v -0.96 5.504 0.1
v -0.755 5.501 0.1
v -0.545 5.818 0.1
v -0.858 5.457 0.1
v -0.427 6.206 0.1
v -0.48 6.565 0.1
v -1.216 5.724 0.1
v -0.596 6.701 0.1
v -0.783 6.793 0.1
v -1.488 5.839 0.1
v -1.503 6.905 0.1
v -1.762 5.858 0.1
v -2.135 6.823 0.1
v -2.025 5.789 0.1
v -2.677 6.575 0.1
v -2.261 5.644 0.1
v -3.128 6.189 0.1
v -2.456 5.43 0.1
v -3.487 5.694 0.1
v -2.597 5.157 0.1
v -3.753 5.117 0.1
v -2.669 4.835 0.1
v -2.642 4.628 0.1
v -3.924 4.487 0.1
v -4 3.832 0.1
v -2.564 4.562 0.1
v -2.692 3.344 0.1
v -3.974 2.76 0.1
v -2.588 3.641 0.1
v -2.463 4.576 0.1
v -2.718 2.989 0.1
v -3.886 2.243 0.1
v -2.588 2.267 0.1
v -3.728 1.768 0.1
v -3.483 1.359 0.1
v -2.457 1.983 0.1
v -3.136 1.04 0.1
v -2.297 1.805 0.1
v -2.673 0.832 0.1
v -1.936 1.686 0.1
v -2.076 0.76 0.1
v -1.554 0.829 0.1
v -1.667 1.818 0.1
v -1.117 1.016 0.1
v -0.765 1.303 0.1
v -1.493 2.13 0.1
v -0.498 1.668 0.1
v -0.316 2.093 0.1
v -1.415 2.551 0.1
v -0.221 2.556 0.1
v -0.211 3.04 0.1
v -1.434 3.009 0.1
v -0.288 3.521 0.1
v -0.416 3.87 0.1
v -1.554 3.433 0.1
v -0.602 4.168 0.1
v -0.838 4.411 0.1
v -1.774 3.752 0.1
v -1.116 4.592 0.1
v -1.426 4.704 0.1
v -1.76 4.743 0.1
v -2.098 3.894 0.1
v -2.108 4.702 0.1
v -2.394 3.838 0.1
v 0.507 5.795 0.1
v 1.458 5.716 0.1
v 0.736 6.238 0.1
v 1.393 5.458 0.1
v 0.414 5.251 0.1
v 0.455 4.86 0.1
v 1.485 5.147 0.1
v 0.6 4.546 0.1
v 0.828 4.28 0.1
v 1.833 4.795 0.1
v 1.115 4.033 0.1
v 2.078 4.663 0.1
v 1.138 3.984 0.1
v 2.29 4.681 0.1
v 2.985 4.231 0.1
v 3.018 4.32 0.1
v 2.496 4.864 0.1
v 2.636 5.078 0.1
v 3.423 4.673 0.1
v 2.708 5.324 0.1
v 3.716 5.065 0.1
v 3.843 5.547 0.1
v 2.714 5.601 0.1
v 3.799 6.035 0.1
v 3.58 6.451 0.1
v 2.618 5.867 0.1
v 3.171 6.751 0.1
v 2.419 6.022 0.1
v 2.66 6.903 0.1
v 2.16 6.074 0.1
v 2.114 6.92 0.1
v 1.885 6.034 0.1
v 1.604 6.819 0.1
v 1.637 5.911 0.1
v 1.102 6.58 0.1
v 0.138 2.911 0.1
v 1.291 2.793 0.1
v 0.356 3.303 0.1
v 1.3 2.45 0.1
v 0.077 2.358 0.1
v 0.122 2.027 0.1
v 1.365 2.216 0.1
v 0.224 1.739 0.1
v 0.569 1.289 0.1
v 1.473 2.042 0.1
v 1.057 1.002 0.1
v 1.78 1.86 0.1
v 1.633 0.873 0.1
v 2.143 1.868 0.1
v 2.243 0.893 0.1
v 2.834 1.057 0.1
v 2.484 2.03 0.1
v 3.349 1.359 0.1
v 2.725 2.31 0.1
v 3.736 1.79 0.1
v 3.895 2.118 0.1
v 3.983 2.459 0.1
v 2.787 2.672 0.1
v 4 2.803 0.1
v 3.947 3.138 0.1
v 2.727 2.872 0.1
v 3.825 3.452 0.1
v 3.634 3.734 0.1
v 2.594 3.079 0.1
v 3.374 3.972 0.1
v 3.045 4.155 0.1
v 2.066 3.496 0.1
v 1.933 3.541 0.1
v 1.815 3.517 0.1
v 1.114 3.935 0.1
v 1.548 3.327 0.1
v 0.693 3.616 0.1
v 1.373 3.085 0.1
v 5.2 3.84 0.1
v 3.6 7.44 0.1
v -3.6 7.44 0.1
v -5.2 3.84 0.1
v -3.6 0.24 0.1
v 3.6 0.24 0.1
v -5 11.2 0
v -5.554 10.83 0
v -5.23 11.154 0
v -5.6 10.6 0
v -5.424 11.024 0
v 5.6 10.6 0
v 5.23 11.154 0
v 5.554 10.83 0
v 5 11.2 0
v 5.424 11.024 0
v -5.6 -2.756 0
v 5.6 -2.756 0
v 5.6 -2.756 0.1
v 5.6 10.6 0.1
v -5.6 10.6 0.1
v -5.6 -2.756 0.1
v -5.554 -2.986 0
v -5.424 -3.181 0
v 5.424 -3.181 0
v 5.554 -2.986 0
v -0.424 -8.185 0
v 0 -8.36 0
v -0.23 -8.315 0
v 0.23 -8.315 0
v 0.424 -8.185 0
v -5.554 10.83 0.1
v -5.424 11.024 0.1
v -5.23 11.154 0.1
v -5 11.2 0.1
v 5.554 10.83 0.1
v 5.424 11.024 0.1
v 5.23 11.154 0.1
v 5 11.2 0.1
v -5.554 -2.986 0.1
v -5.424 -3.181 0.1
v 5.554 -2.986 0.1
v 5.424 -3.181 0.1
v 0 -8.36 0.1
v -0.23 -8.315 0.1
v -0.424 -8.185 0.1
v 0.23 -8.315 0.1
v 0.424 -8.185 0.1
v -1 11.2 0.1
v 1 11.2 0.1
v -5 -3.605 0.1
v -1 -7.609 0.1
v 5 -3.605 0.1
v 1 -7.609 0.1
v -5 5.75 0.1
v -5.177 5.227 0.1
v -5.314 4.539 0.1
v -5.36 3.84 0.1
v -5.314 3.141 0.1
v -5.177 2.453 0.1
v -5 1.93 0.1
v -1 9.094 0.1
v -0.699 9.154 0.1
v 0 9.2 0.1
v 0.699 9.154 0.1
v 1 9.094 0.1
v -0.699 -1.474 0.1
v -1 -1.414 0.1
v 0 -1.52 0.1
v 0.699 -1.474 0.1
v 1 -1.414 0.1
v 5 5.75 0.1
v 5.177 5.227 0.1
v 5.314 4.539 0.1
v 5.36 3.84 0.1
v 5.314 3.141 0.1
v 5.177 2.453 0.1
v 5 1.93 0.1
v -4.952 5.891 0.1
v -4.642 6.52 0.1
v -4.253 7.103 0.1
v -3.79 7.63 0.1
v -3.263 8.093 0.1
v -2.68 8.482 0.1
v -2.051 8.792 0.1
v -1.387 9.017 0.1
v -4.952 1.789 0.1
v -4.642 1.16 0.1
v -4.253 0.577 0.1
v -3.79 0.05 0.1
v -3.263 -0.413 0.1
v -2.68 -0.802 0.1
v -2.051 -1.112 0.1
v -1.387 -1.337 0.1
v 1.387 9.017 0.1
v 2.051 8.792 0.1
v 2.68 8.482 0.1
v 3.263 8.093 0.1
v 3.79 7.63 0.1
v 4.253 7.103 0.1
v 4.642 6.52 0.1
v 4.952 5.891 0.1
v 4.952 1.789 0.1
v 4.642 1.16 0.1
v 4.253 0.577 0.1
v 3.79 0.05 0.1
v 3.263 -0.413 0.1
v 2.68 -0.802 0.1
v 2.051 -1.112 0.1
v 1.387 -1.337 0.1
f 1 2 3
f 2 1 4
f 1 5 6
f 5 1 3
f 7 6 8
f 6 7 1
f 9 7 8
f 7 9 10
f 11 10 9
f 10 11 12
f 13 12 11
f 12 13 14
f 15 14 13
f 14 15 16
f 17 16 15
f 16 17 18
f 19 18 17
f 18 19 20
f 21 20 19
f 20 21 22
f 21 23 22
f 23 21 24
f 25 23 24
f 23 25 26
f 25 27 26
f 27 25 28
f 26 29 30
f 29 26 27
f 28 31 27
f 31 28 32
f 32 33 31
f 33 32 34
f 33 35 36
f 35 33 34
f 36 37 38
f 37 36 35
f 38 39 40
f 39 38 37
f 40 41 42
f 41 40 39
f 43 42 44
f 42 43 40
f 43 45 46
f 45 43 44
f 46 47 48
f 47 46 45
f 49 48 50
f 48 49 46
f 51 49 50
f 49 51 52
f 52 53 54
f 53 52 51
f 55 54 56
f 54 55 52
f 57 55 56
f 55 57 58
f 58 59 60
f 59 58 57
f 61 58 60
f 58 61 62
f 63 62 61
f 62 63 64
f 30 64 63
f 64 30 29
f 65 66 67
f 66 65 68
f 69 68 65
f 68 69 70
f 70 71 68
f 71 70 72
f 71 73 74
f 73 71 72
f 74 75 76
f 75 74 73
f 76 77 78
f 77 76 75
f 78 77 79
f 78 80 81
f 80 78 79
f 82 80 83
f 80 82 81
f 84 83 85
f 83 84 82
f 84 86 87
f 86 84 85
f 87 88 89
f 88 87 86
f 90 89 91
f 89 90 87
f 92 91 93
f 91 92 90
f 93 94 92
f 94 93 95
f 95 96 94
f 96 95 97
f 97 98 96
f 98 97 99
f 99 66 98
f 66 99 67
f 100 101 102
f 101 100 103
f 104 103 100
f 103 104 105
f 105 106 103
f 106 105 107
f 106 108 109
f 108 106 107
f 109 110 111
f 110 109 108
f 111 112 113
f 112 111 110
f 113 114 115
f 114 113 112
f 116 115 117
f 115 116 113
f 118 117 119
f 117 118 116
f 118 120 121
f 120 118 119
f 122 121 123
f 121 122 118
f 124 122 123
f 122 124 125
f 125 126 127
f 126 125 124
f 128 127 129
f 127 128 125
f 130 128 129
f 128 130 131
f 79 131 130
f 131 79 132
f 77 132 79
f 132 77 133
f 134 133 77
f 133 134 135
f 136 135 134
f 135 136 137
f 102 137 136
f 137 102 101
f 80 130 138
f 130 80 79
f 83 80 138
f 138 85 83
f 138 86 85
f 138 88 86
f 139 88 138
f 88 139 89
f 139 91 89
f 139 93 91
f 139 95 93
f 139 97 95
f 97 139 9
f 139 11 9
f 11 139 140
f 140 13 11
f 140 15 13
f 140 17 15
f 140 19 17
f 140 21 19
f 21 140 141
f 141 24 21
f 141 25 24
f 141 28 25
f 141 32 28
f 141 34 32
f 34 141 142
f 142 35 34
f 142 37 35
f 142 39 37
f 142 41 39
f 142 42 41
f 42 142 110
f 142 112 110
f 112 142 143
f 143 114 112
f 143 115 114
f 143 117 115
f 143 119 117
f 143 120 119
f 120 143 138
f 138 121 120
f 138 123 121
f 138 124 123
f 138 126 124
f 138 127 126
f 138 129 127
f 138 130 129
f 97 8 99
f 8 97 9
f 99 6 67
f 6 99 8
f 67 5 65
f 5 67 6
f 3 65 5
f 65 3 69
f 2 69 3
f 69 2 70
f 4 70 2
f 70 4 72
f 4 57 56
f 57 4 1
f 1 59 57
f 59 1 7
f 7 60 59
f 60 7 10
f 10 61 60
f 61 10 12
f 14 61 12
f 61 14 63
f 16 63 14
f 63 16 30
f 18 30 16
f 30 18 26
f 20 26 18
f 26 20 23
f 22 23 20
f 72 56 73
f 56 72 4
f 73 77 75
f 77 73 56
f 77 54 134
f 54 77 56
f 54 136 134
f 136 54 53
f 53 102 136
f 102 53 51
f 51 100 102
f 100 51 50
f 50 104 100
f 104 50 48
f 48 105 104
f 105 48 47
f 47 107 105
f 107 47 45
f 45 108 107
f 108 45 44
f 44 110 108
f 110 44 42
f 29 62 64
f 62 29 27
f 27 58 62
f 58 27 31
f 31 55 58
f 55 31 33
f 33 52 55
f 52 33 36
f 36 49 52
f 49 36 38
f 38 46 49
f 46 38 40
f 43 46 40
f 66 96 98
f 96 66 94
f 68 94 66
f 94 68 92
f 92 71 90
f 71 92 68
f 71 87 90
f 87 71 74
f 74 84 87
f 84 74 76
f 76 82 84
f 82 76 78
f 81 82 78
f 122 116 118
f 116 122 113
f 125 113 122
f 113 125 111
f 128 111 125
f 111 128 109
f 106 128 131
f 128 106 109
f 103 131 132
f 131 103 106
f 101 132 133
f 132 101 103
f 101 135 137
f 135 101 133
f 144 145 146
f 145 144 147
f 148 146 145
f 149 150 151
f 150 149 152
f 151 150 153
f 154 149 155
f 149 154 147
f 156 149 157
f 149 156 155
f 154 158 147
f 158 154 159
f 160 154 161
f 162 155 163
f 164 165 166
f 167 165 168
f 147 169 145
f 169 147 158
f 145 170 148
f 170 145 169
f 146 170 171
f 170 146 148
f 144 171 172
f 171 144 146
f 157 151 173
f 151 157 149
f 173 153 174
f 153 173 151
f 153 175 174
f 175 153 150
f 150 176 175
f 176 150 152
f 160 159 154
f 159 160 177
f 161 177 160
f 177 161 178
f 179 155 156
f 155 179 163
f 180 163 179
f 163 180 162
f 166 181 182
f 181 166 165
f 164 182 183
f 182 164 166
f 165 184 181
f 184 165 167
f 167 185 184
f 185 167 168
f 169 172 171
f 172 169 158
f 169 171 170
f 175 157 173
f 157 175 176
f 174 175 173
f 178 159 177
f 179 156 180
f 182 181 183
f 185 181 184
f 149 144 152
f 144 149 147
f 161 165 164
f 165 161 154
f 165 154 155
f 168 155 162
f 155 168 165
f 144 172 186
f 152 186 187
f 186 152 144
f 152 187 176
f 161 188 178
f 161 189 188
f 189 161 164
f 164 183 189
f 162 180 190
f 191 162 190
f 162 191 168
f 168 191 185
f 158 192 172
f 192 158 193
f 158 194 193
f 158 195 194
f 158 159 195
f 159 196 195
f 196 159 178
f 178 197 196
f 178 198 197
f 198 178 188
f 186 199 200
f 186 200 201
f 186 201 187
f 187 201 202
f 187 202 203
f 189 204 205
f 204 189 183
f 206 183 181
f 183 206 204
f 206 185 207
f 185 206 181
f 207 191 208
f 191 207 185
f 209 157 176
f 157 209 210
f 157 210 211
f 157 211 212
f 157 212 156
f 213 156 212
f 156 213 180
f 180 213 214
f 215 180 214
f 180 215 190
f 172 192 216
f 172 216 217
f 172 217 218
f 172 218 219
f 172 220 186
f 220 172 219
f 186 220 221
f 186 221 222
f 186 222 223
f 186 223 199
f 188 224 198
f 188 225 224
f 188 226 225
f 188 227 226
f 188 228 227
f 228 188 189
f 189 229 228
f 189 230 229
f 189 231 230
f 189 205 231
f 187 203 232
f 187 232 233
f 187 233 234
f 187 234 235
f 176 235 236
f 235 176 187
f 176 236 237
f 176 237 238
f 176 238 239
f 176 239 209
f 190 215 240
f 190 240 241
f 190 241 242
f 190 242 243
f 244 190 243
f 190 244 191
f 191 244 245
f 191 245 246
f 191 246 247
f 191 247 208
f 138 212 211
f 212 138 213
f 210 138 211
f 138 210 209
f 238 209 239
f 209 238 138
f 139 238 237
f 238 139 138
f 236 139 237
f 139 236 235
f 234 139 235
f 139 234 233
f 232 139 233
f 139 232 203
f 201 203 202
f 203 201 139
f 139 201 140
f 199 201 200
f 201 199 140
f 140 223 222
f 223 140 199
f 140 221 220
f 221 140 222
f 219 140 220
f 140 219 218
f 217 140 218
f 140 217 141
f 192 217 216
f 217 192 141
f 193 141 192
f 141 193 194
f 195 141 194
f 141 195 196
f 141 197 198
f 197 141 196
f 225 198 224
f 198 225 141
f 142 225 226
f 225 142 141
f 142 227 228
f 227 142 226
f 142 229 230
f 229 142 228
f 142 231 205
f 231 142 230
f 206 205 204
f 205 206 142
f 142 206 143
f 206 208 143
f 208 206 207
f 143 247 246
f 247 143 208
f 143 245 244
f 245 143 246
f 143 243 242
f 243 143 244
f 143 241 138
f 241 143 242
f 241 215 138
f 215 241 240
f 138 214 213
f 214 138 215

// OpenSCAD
// file: ../p/box3u12.scad
use <../lib.scad>
function ldraw_lib__box3u12() = [
// 0 Box with 3 Parallel Faces without Any Edges
// 0 Name: box3u12.dat
// 0 Author: J.C. Tchang [tchang]
// 0 !LDRAW_ORG Primitive UPDATE 2014-02
// 0 !LICENSE Licensed under CC BY 4.0 : see CAreadme.txt
// 
// 0 BFC CERTIFY CCW
  [0,"BFC","CERTIFY"],
  [0,"BFC","CCW"],
// 
// 0 !HISTORY 2014-12-23 [PTadmin] Official Update 2014-02
// 
// 
// 4 16 -1 1 1 1 1 1 1 1 -1 -1 1 -1
  [4,16,-1,1,1,1,1,1,1,1,-1,-1,1,-1],
// 4 16 -1 1 1 -1 0 1 1 0 1 1 1 1
  [4,16,-1,1,1,-1,0,1,1,0,1,1,1,1],
// 4 16 1 1 -1 1 0 -1 -1 0 -1 -1 1 -1
  [4,16,1,1,-1,1,0,-1,-1,0,-1,-1,1,-1],
];
module ldraw_lib__box3u12(step=0, col=false, unit=2/5, alt=false, line=0.2, solid=!$preview)
    makepoly(ldraw_lib__box3u12(), step=step, col=col, unit=unit, alt=alt, line=line, solid=solid);
ldraw_lib__box3u12(line=0.2);
// file: ../p/1-8cyli.scad
use <../lib.scad>
function ldraw_lib__1_8cyli() = [
// 0 Cylinder 0.125
// 0 Name: 1-8cyli.dat
// 0 Author: James Jessiman
// 0 !LDRAW_ORG Primitive UPDATE 2005-01
// 0 !LICENSE Licensed under CC BY 4.0 : see CAreadme.txt
// 
// 0 BFC CERTIFY CCW
  [0,"BFC","CERTIFY"],
  [0,"BFC","CCW"],
// 
// 0 !HISTORY 2002-04-25 [PTadmin] Official Update 2002-02
// 0 !HISTORY 2004-12-11 [nielsk] Recreated using Primitive Generator, Edge lines fixed, BFC changed to CCW
// 0 !HISTORY 2005-12-28 [PTadmin] Official Update 2005-01
// 0 !HISTORY 2007-06-22 [PTadmin] Header formatted for Contributor Agreement
// 0 !HISTORY 2008-07-01 [PTadmin] Official Update 2008-01
// 
// 
// 4 16 .9239 1 .3827 .9239 0 .3827 1 0 0 1 1 0
  [4,16,.9239,1,.3827,.9239,0,.3827,1,0,0,1,1,0],
// 4 16 .7071 1 .7071 .7071 0 .7071 .9239 0 .3827 .9239 1 .3827
  [4,16,.7071,1,.7071,.7071,0,.7071,.9239,0,.3827,.9239,1,.3827],
// 5 24 1 1 0 1 0 0 1 1 -.4142 .9239 1 .3827
  [5,24,1,1,0,1,0,0,1,1,-.4142,.9239,1,.3827],
// 5 24 .9239 1 .3827 .9239 0 .3827 1 1 0 .7071 1 .7071
  [5,24,.9239,1,.3827,.9239,0,.3827,1,1,0,.7071,1,.7071],
// 5 24 .7071 1 .7071 .7071 0 .7071 .9239 1 .3827 .4142 1 1
  [5,24,.7071,1,.7071,.7071,0,.7071,.9239,1,.3827,.4142,1,1],
// 0
];
module ldraw_lib__1_8cyli(step=0, col=false, unit=2/5, alt=false, line=0.2, solid=!$preview)
    makepoly(ldraw_lib__1_8cyli(), step=step, col=col, unit=unit, alt=alt, line=line, solid=solid);
ldraw_lib__1_8cyli(line=0.2);
// file: ../p/1-8chrd.scad
use <../lib.scad>
function ldraw_lib__1_8chrd() = [
// 0 Chord 0.125
// 0 Name: 1-8chrd.dat
// 0 Author: Orion Pobursky [OrionP]
// 0 !LDRAW_ORG Primitive UPDATE 2023-05
// 0 !LICENSE Licensed under CC BY 4.0 : see CAreadme.txt
// 
// 0 BFC CERTIFY CCW
  [0,"BFC","CERTIFY"],
  [0,"BFC","CCW"],
// 
// 0 !HISTORY 2004-04-22 [PTadmin] Official Update 2004-02
// 0 !HISTORY 2007-06-22 [PTadmin] Header formatted for Contributor Agreement
// 0 !HISTORY 2008-07-01 [PTadmin] Official Update 2008-01
// 0 !HISTORY 2023-10-27 [OrionP] Rebuilt with PrimGen2, original author westrate
// 0 !HISTORY 2023-10-31 [OrionP] Official Update 2023-05
// 
// 3 16 1 0 0 0.9239 0 0.3827 0.7071 0 0.7071
  [3,16,1,0,0,0.9239,0,0.3827,0.7071,0,0.7071],
];
module ldraw_lib__1_8chrd(step=0, col=false, unit=2/5, alt=false, line=0.2, solid=!$preview)
    makepoly(ldraw_lib__1_8chrd(), step=step, col=col, unit=unit, alt=alt, line=line, solid=solid);
ldraw_lib__1_8chrd(line=0.2);
// file: ../p/1-4cyli.scad
use <../lib.scad>
function ldraw_lib__1_4cyli() = [
// 0 Cylinder 0.25
// 0 Name: 1-4cyli.dat
// 0 Author: James Jessiman
// 0 !LDRAW_ORG Primitive UPDATE 2012-01
// 0 !LICENSE Licensed under CC BY 4.0 : see CAreadme.txt
// 
// 0 BFC CERTIFY CCW
  [0,"BFC","CERTIFY"],
  [0,"BFC","CCW"],
// 
// 0 !HISTORY 2002-03-23 [sbliss] Added BFC statement.
// 0 !HISTORY 2002-04-25 [PTadmin] Official Update 2002-02
// 0 !HISTORY 2007-06-22 [PTadmin] Header formatted for Contributor Agreement
// 0 !HISTORY 2008-07-01 [PTadmin] Official Update 2008-01
// 0 !HISTORY 2012-02-16 [Philo] Changed to CCW
// 0 !HISTORY 2012-03-30 [PTadmin] Official Update 2012-01
// 
// 
// 4 16 1 1 0 0.9239 1 0.3827 0.9239 0 0.3827 1 0 0
  [4,16,1,1,0,0.9239,1,0.3827,0.9239,0,0.3827,1,0,0],
// 5 24 1 0 0 1 1 0 0.9239 0 0.3827 1 0 -1
  [5,24,1,0,0,1,1,0,0.9239,0,0.3827,1,0,-1],
// 4 16 0.9239 1 0.3827 0.7071 1 0.7071 0.7071 0 0.7071 0.9239 0 0.3827
  [4,16,0.9239,1,0.3827,0.7071,1,0.7071,0.7071,0,0.7071,0.9239,0,0.3827],
// 5 24 0.9239 0 0.3827 0.9239 1 0.3827 0.7071 0 0.7071 1 0 0
  [5,24,0.9239,0,0.3827,0.9239,1,0.3827,0.7071,0,0.7071,1,0,0],
// 4 16 0.7071 1 0.7071 0.3827 1 0.9239 0.3827 0 0.9239 0.7071 0 0.7071
  [4,16,0.7071,1,0.7071,0.3827,1,0.9239,0.3827,0,0.9239,0.7071,0,0.7071],
// 5 24 0.7071 0 0.7071 0.7071 1 0.7071 0.3827 0 0.9239 0.9239 0 0.3827
  [5,24,0.7071,0,0.7071,0.7071,1,0.7071,0.3827,0,0.9239,0.9239,0,0.3827],
// 4 16 0.3827 1 0.9239 0 1 1 0 0 1 0.3827 0 0.9239
  [4,16,0.3827,1,0.9239,0,1,1,0,0,1,0.3827,0,0.9239],
// 5 24 0.3827 0 0.9239 0.3827 1 0.9239 0 0 1 0.7071 0 0.7071
  [5,24,0.3827,0,0.9239,0.3827,1,0.9239,0,0,1,0.7071,0,0.7071],
// 5 24 0 0 1 0 1 1 0.3827 0 0.9239 -1 0 1
  [5,24,0,0,1,0,1,1,0.3827,0,0.9239,-1,0,1],
];
module ldraw_lib__1_4cyli(step=0, col=false, unit=2/5, alt=false, line=0.2, solid=!$preview)
    makepoly(ldraw_lib__1_4cyli(), step=step, col=col, unit=unit, alt=alt, line=line, solid=solid);
ldraw_lib__1_4cyli(line=0.2);
// file: ../p/1-4chrd.scad
use <../lib.scad>
function ldraw_lib__1_4chrd() = [
// 0 Chord 0.25
// 0 Name: 1-4chrd.dat
// 0 Author: Max Martin Richter [MMR1988]
// 0 !LDRAW_ORG Primitive UPDATE 2023-05
// 0 !LICENSE Licensed under CC BY 4.0 : see CAreadme.txt
// 
// 0 BFC CERTIFY CCW
  [0,"BFC","CERTIFY"],
  [0,"BFC","CCW"],
// 
// 0 !HISTORY 2004-04-22 [PTadmin] Official Update 2004-02
// 0 !HISTORY 2007-10-09 [PTadmin] Header formatted for Contributor Agreement
// 0 !HISTORY 2008-07-01 [PTadmin] Official Update 2008-01
// 0 !HISTORY 2012-08-02 [MMR1988] Re-creation with PrimGen2 and Rectifier
// 0 !HISTORY 2012-08-09 [PTadmin] Official Update 2012-02
// 0 !HISTORY 2023-10-27 [OrionP] Change author to MMR1988 from hafhead
// 0 !HISTORY 2023-10-31 [OrionP] Official Update 2023-05
// 
// 4 16 0.9239 0 0.3827 0.3827 0 0.9239 0 0 1 1 0 0
  [4,16,0.9239,0,0.3827,0.3827,0,0.9239,0,0,1,1,0,0],
// 3 16 0.7071 0 0.7071 0.3827 0 0.9239 0.9239 0 0.3827
  [3,16,0.7071,0,0.7071,0.3827,0,0.9239,0.9239,0,0.3827],
];
module ldraw_lib__1_4chrd(step=0, col=false, unit=2/5, alt=false, line=0.2, solid=!$preview)
    makepoly(ldraw_lib__1_4chrd(), step=step, col=col, unit=unit, alt=alt, line=line, solid=solid);
ldraw_lib__1_4chrd(line=0.2);
// main file
use <../lib.scad>
use <../p/1-4chrd.scad>
use <../p/1-4cyli.scad>
use <../p/1-8chrd.scad>
use <../p/1-8cyli.scad>
use <../p/box3u12.scad>
use <s/6218741fs01.scad>
function ldraw_lib__6218741f() = [
// 0 Sticker  2.4 x  1.4 with Black "68" in White Disc and Gold Stripes on Black Background
// 0 Name: 6218741f.dat
// 0 Author: Massimo Maso [Sirio]
// 0 !LDRAW_ORG Part UPDATE 2026-08
// 0 !LICENSE Licensed under CC BY 4.0 : see CAreadme.txt
// 
// 0 BFC CERTIFY CCW
  [0,"BFC","CERTIFY"],
  [0,"BFC","CCW"],
// 
// 0 !CATEGORY Sticker
// 0 !KEYWORDS 1968, BrickLink 75884stk01, Brickowl 37251, Fastback, Ford, Mustang
// 0 !KEYWORDS Rebrickable 37571, Set 75884, Speed Champions
// 
// 0 !HISTORY 2026-08-31 [OrionP] Official Update 2026-08
// 
// 0 // Subparts
// 1 16 0 -.25 9.6 1 0 0 0 1 0 0 0 1 s\6218741fs01.dat
  [1,16,0,-.25,9.6,1,0,0,0,1,0,0,0,1, ldraw_lib__s__6218741fs01()],
// 0 // Primitives
// 1 16 -12.5 0 26.5 -1.5 0 0 0 -1 0 0 0 1.5 1-4chrd.dat
  [1,16,-12.5,0,26.5,-1.5,0,0,0,-1,0,0,0,1.5, ldraw_lib__1_4chrd()],
// 1 16 12.5 0 26.5 1.5 0 0 0 -1 0 0 0 1.5 1-4chrd.dat
  [1,16,12.5,0,26.5,1.5,0,0,0,-1,0,0,0,1.5, ldraw_lib__1_4chrd()],
// 1 16 0 -.25 9.8045 0 0 14 0 .25 0 16.6955 0 0 box3u12.dat
  [1,16,0,-.25,9.8045,0,0,14,0,.25,0,16.6955,0,0, ldraw_lib__box3u12()],
// 1 16 -12.5 0 -6.891 -1.5 0 0 0 -1 0 0 0 -1.5 1-8chrd.dat
  [1,16,-12.5,0,-6.891,-1.5,0,0,0,-1,0,0,0,-1.5, ldraw_lib__1_8chrd()],
// 1 16 12.5 0 -6.891 1.5 0 0 0 -1 0 0 0 -1.5 1-8chrd.dat
  [1,16,12.5,0,-6.891,1.5,0,0,0,-1,0,0,0,-1.5, ldraw_lib__1_8chrd()],
// 1 16 0 0 -19.4012 0 0 -1.5 0 -1 0 -1.5 0 0 1-8chrd.dat
  [1,16,0,0,-19.4012,0,0,-1.5,0,-1,0,-1.5,0,0, ldraw_lib__1_8chrd()],
// 1 16 0 0 -19.4012 0 0 1.5 0 -1 0 -1.5 0 0 1-8chrd.dat
  [1,16,0,0,-19.4012,0,0,1.5,0,-1,0,-1.5,0,0, ldraw_lib__1_8chrd()],
// 1 16 -12.5 -.25 26.5 -1.5 0 0 0 .25 0 0 0 1.5 1-4cyli.dat
  [1,16,-12.5,-.25,26.5,-1.5,0,0,0,.25,0,0,0,1.5, ldraw_lib__1_4cyli()],
// 1 16 12.5 -.25 26.5 1.5 0 0 0 .25 0 0 0 1.5 1-4cyli.dat
  [1,16,12.5,-.25,26.5,1.5,0,0,0,.25,0,0,0,1.5, ldraw_lib__1_4cyli()],
// 1 16 -12.5 -.25 -6.891 -1.5 0 0 0 .25 0 0 0 -1.5 1-8cyli.dat
  [1,16,-12.5,-.25,-6.891,-1.5,0,0,0,.25,0,0,0,-1.5, ldraw_lib__1_8cyli()],
// 1 16 12.5 -.25 -6.891 1.5 0 0 0 .25 0 0 0 -1.5 1-8cyli.dat
  [1,16,12.5,-.25,-6.891,1.5,0,0,0,.25,0,0,0,-1.5, ldraw_lib__1_8cyli()],
// 1 16 0 -.25 -19.4012 0 0 -1.5 0 .25 0 -1.5 0 0 1-8cyli.dat
  [1,16,0,-.25,-19.4012,0,0,-1.5,0,.25,0,-1.5,0,0, ldraw_lib__1_8cyli()],
// 1 16 0 -.25 -19.4012 0 0 1.5 0 .25 0 -1.5 0 0 1-8cyli.dat
  [1,16,0,-.25,-19.4012,0,0,1.5,0,.25,0,-1.5,0,0, ldraw_lib__1_8cyli()],
// 1 0 -12.5 -.25 26.5 -1.5 0 0 0 1 0 0 0 1.5 1-4chrd.dat
  [1,0,-12.5,-.25,26.5,-1.5,0,0,0,1,0,0,0,1.5, ldraw_lib__1_4chrd()],
// 1 0 12.5 -.25 26.5 1.5 0 0 0 1 0 0 0 1.5 1-4chrd.dat
  [1,0,12.5,-.25,26.5,1.5,0,0,0,1,0,0,0,1.5, ldraw_lib__1_4chrd()],
// 1 0 -12.5 -.25 -6.891 -1.5 0 0 0 1 0 0 0 -1.5 1-8chrd.dat
  [1,0,-12.5,-.25,-6.891,-1.5,0,0,0,1,0,0,0,-1.5, ldraw_lib__1_8chrd()],
// 1 0 12.5 -.25 -6.891 1.5 0 0 0 1 0 0 0 -1.5 1-8chrd.dat
  [1,0,12.5,-.25,-6.891,1.5,0,0,0,1,0,0,0,-1.5, ldraw_lib__1_8chrd()],
// 1 0 0 -.25 -19.4012 0 0 -1.5 0 1 0 -1.5 0 0 1-8chrd.dat
  [1,0,0,-.25,-19.4012,0,0,-1.5,0,1,0,-1.5,0,0, ldraw_lib__1_8chrd()],
// 1 0 0 -.25 -19.4012 0 0 1.5 0 1 0 -1.5 0 0 1-8chrd.dat
  [1,0,0,-.25,-19.4012,0,0,1.5,0,1,0,-1.5,0,0, ldraw_lib__1_8chrd()],
// 0 // Bottom face
// 4 16 -12.5 0 28 12.5 0 28 14 0 26.5 -14 0 26.5
  [4,16,-12.5,0,28,12.5,0,28,14,0,26.5,-14,0,26.5],
// 4 16 0 0 -20.9012 -1.0607 0 -20.4619 -13.5607 0 -7.9517 -14 0 -6.891
  [4,16,0,0,-20.9012,-1.0607,0,-20.4619,-13.5607,0,-7.9517,-14,0,-6.891],
// 3 16 0 0 -20.9012 -14 0 -6.891 14 0 -6.891
  [3,16,0,0,-20.9012,-14,0,-6.891,14,0,-6.891],
// 4 16 0 0 -20.9012 14 0 -6.891 13.5607 0 -7.9517 1.0607 0 -20.4619
  [4,16,0,0,-20.9012,14,0,-6.891,13.5607,0,-7.9517,1.0607,0,-20.4619],
// 0 // Lateral face
// 3 16 -12.5 0 28 -12.5 -.25 28 -2.5 -.25 28
  [3,16,-12.5,0,28,-12.5,-.25,28,-2.5,-.25,28],
// 4 16 -12.5 0 28 -2.5 -.25 28 2.5 -.25 28 12.5 0 28
  [4,16,-12.5,0,28,-2.5,-.25,28,2.5,-.25,28,12.5,0,28],
// 3 16 12.5 0 28 2.5 -.25 28 12.5 -.25 28
  [3,16,12.5,0,28,2.5,-.25,28,12.5,-.25,28],
// 3 16 -13.5607 0 -7.9517 -12.5 -.25 -9.0132 -13.5607 -.25 -7.9517
  [3,16,-13.5607,0,-7.9517,-12.5,-.25,-9.0132,-13.5607,-.25,-7.9517],
// 4 16 -13.5607 0 -7.9517 -1.0607 0 -20.4619 -2.5 -.25 -19.0213 -12.5 -.25 -9.0132
  [4,16,-13.5607,0,-7.9517,-1.0607,0,-20.4619,-2.5,-.25,-19.0213,-12.5,-.25,-9.0132],
// 3 16 -1.0607 0 -20.4619 -1.0607 -.25 -20.4619 -2.5 -.25 -19.0213
  [3,16,-1.0607,0,-20.4619,-1.0607,-.25,-20.4619,-2.5,-.25,-19.0213],
// 3 16 13.5607 0 -7.9517 13.5607 -.25 -7.9517 12.5 -.25 -9.0132
  [3,16,13.5607,0,-7.9517,13.5607,-.25,-7.9517,12.5,-.25,-9.0132],
// 4 16 13.5607 0 -7.9517 12.5 -.25 -9.0132 2.5 -.25 -19.0213 1.0607 0 -20.4619
  [4,16,13.5607,0,-7.9517,12.5,-.25,-9.0132,2.5,-.25,-19.0213,1.0607,0,-20.4619],
// 3 16 1.0607 0 -20.4619 2.5 -.25 -19.0213 1.0607 -.25 -20.4619
  [3,16,1.0607,0,-20.4619,2.5,-.25,-19.0213,1.0607,-.25,-20.4619],
// 0 // Conditional lines
// 5 24 -13.5607 0 -7.9517 -13.5607 -.25 -7.9517 -1.0607 0 -20.4619 -13.8859 0 -7.4651
  [5,24,-13.5607,0,-7.9517,-13.5607,-.25,-7.9517,-1.0607,0,-20.4619,-13.8859,0,-7.4651],
// 5 24 13.5607 0 -7.9517 13.5607 -.25 -7.9517 1.0607 0 -20.4619 13.8859 0 -7.4651
  [5,24,13.5607,0,-7.9517,13.5607,-.25,-7.9517,1.0607,0,-20.4619,13.8859,0,-7.4651],
// 5 24 -1.0607 0 -20.4619 -1.0607 -.25 -20.4619 -.5741 0 -20.7871 -13.5607 0 -7.9517
  [5,24,-1.0607,0,-20.4619,-1.0607,-.25,-20.4619,-.5741,0,-20.7871,-13.5607,0,-7.9517],
// 5 24 1.0607 0 -20.4619 1.0607 -.25 -20.4619 .5741 0 -20.7871 13.5607 0 -7.9517
  [5,24,1.0607,0,-20.4619,1.0607,-.25,-20.4619,.5741,0,-20.7871,13.5607,0,-7.9517],
// 0 // Top face
// 0 // Black faces
// 0 // Left stripe
// 4 0 -14 -.25 26.5 -12.9431 -.25 13.0679 -12.5 -.25 14.375 -12.5 -.25 28
  [4,0,-14,-.25,26.5,-12.9431,-.25,13.0679,-12.5,-.25,14.375,-12.5,-.25,28],
// 3 0 -14 -.25 26.5 -13.2848 -.25 11.3487 -12.9431 -.25 13.0679
  [3,0,-14,-.25,26.5,-13.2848,-.25,11.3487,-12.9431,-.25,13.0679],
// 3 0 -14 -.25 26.5 -13.4 -.25 9.6 -13.2848 -.25 11.3487
  [3,0,-14,-.25,26.5,-13.4,-.25,9.6,-13.2848,-.25,11.3487],
// 3 0 -14 -.25 26.5 -14 -.25 -6.891 -13.4 -.25 9.6
  [3,0,-14,-.25,26.5,-14,-.25,-6.891,-13.4,-.25,9.6],
// 4 0 -13.5607 -.25 -7.9517 -13.2848 -.25 7.8513 -13.4 -.25 9.6 -14 -.25 -6.891
  [4,0,-13.5607,-.25,-7.9517,-13.2848,-.25,7.8513,-13.4,-.25,9.6,-14,-.25,-6.891],
// 3 0 -13.5607 -.25 -7.9517 -12.9431 -.25 6.1321 -13.2848 -.25 7.8513
  [3,0,-13.5607,-.25,-7.9517,-12.9431,-.25,6.1321,-13.2848,-.25,7.8513],
// 4 0 -13.5607 -.25 -7.9517 -12.5 -.25 -9.0132 -12.5 -.25 4.8251 -12.9431 -.25 6.1321
  [4,0,-13.5607,-.25,-7.9517,-12.5,-.25,-9.0132,-12.5,-.25,4.8251,-12.9431,-.25,6.1321],
// 0 // Central stripe
// 3 0 -2.5 -.25 28 -2.5 -.25 22.7354 -1.7487 -.25 22.8848
  [3,0,-2.5,-.25,28,-2.5,-.25,22.7354,-1.7487,-.25,22.8848],
// 3 0 -2.5 -.25 28 -1.7487 -.25 22.8848 0 -.25 23
  [3,0,-2.5,-.25,28,-1.7487,-.25,22.8848,0,-.25,23],
// 3 0 -2.5 -.25 28 0 -.25 23 2.5 -.25 28
  [3,0,-2.5,-.25,28,0,-.25,23,2.5,-.25,28],
// 3 0 2.5 -.25 28 0 -.25 23 1.7487 -.25 22.8848
  [3,0,2.5,-.25,28,0,-.25,23,1.7487,-.25,22.8848],
// 3 0 2.5 -.25 28 1.7487 -.25 22.8848 2.5 -.25 22.7354
  [3,0,2.5,-.25,28,1.7487,-.25,22.8848,2.5,-.25,22.7354],
// 4 0 -1.0607 -.25 -20.4619 -1.7487 -.25 -3.6848 -2.5 -.25 -3.5354 -2.5 -.25 -19.0213
  [4,0,-1.0607,-.25,-20.4619,-1.7487,-.25,-3.6848,-2.5,-.25,-3.5354,-2.5,-.25,-19.0213],
// 4 0 -1.0607 -.25 -20.4619 0 -.25 -20.9012 0 -.25 -3.8 -1.7487 -.25 -3.6848
  [4,0,-1.0607,-.25,-20.4619,0,-.25,-20.9012,0,-.25,-3.8,-1.7487,-.25,-3.6848],
// 4 0 1.0607 -.25 -20.4619 1.7487 -.25 -3.6848 0 -.25 -3.8 0 -.25 -20.9012
  [4,0,1.0607,-.25,-20.4619,1.7487,-.25,-3.6848,0,-.25,-3.8,0,-.25,-20.9012],
// 4 0 1.0607 -.25 -20.4619 2.5 -.25 -19.0213 2.5 -.25 -3.5354 1.7487 -.25 -3.6848
  [4,0,1.0607,-.25,-20.4619,2.5,-.25,-19.0213,2.5,-.25,-3.5354,1.7487,-.25,-3.6848],
// 0 // Right stripe
// 4 0 14 -.25 26.5 12.5 -.25 28 12.5 -.25 14.375 12.9431 -.25 13.0679
  [4,0,14,-.25,26.5,12.5,-.25,28,12.5,-.25,14.375,12.9431,-.25,13.0679],
// 3 0 14 -.25 26.5 12.9431 -.25 13.0679 13.2848 -.25 11.3487
  [3,0,14,-.25,26.5,12.9431,-.25,13.0679,13.2848,-.25,11.3487],
// 3 0 14 -.25 26.5 13.2848 -.25 11.3487 13.4 -.25 9.6
  [3,0,14,-.25,26.5,13.2848,-.25,11.3487,13.4,-.25,9.6],
// 3 0 14 -.25 26.5 13.4 -.25 9.6 14 -.25 -6.891
  [3,0,14,-.25,26.5,13.4,-.25,9.6,14,-.25,-6.891],
// 4 0 13.5607 -.25 -7.9517 14 -.25 -6.891 13.4 -.25 9.6 13.2848 -.25 7.8513
  [4,0,13.5607,-.25,-7.9517,14,-.25,-6.891,13.4,-.25,9.6,13.2848,-.25,7.8513],
// 3 0 13.5607 -.25 -7.9517 13.2848 -.25 7.8513 12.9431 -.25 6.1321
  [3,0,13.5607,-.25,-7.9517,13.2848,-.25,7.8513,12.9431,-.25,6.1321],
// 4 0 13.5607 -.25 -7.9517 12.9431 -.25 6.1321 12.5 -.25 4.8251 12.5 -.25 -9.0132
  [4,0,13.5607,-.25,-7.9517,12.9431,-.25,6.1321,12.5,-.25,4.8251,12.5,-.25,-9.0132],
// 0 // Gold faces
// 0 // Left stripe
// 3 189 -12.5 -.25 28 -12.5 -.25 14.375 -12.3803 -.25 14.7282
  [3,189,-12.5,-.25,28,-12.5,-.25,14.375,-12.3803,-.25,14.7282],
// 3 189 -12.5 -.25 28 -12.3803 -.25 14.7282 -11.6044 -.25 16.3
  [3,189,-12.5,-.25,28,-12.3803,-.25,14.7282,-11.6044,-.25,16.3],
// 3 189 -12.5 -.25 28 -11.6044 -.25 16.3 -10.6316 -.25 17.7579
  [3,189,-12.5,-.25,28,-11.6044,-.25,16.3,-10.6316,-.25,17.7579],
// 3 189 -12.5 -.25 28 -10.6316 -.25 17.7579 -9.4751 -.25 19.0751
  [3,189,-12.5,-.25,28,-10.6316,-.25,17.7579,-9.4751,-.25,19.0751],
// 4 189 -12.5 -.25 28 -9.4751 -.25 19.0751 -8.1579 -.25 20.2316 -2.5 -.25 28
  [4,189,-12.5,-.25,28,-9.4751,-.25,19.0751,-8.1579,-.25,20.2316,-2.5,-.25,28],
// 3 189 -2.5 -.25 28 -8.1579 -.25 20.2316 -6.7 -.25 21.2044
  [3,189,-2.5,-.25,28,-8.1579,-.25,20.2316,-6.7,-.25,21.2044],
// 3 189 -2.5 -.25 28 -6.7 -.25 21.2044 -5.1282 -.25 21.9803
  [3,189,-2.5,-.25,28,-6.7,-.25,21.2044,-5.1282,-.25,21.9803],
// 3 189 -2.5 -.25 28 -5.1282 -.25 21.9803 -3.4679 -.25 22.5431
  [3,189,-2.5,-.25,28,-5.1282,-.25,21.9803,-3.4679,-.25,22.5431],
// 3 189 -2.5 -.25 28 -3.4679 -.25 22.5431 -2.5 -.25 22.7354
  [3,189,-2.5,-.25,28,-3.4679,-.25,22.5431,-2.5,-.25,22.7354],
// 3 189 -12.5 -.25 -9.0132 -12.3803 -.25 4.4718 -12.5 -.25 4.8251
  [3,189,-12.5,-.25,-9.0132,-12.3803,-.25,4.4718,-12.5,-.25,4.8251],
// 3 189 -12.5 -.25 -9.0132 -11.6044 -.25 2.9 -12.3803 -.25 4.4718
  [3,189,-12.5,-.25,-9.0132,-11.6044,-.25,2.9,-12.3803,-.25,4.4718],
// 3 189 -12.5 -.25 -9.0132 -10.6316 -.25 1.4421 -11.6044 -.25 2.9
  [3,189,-12.5,-.25,-9.0132,-10.6316,-.25,1.4421,-11.6044,-.25,2.9],
// 3 189 -12.5 -.25 -9.0132 -9.4751 -.25 .1249 -10.6316 -.25 1.4421
  [3,189,-12.5,-.25,-9.0132,-9.4751,-.25,.1249,-10.6316,-.25,1.4421],
// 4 189 -12.5 -.25 -9.0132 -2.5 -.25 -19.0213 -8.1579 -.25 -1.0316 -9.4751 -.25 .1249
  [4,189,-12.5,-.25,-9.0132,-2.5,-.25,-19.0213,-8.1579,-.25,-1.0316,-9.4751,-.25,.1249],
// 3 189 -2.5 -.25 -19.0213 -6.7 -.25 -2.0044 -8.1579 -.25 -1.0316
  [3,189,-2.5,-.25,-19.0213,-6.7,-.25,-2.0044,-8.1579,-.25,-1.0316],
// 3 189 -2.5 -.25 -19.0213 -5.1282 -.25 -2.7803 -6.7 -.25 -2.0044
  [3,189,-2.5,-.25,-19.0213,-5.1282,-.25,-2.7803,-6.7,-.25,-2.0044],
// 3 189 -2.5 -.25 -19.0213 -3.4679 -.25 -3.3431 -5.1282 -.25 -2.7803
  [3,189,-2.5,-.25,-19.0213,-3.4679,-.25,-3.3431,-5.1282,-.25,-2.7803],
// 3 189 -2.5 -.25 -19.0213 -2.5 -.25 -3.5354 -3.4679 -.25 -3.3431
  [3,189,-2.5,-.25,-19.0213,-2.5,-.25,-3.5354,-3.4679,-.25,-3.3431],
// 0 // Right stripe
// 3 189 2.5 -.25 28 2.5 -.25 22.7354 3.4679 -.25 22.5431
  [3,189,2.5,-.25,28,2.5,-.25,22.7354,3.4679,-.25,22.5431],
// 3 189 2.5 -.25 28 3.4679 -.25 22.5431 5.1282 -.25 21.9803
  [3,189,2.5,-.25,28,3.4679,-.25,22.5431,5.1282,-.25,21.9803],
// 3 189 2.5 -.25 28 5.1282 -.25 21.9803 6.7 -.25 21.2044
  [3,189,2.5,-.25,28,5.1282,-.25,21.9803,6.7,-.25,21.2044],
// 3 189 2.5 -.25 28 6.7 -.25 21.2044 8.1579 -.25 20.2316
  [3,189,2.5,-.25,28,6.7,-.25,21.2044,8.1579,-.25,20.2316],
// 4 189 12.5 -.25 28 2.5 -.25 28 8.1579 -.25 20.2316 9.4751 -.25 19.0751
  [4,189,12.5,-.25,28,2.5,-.25,28,8.1579,-.25,20.2316,9.4751,-.25,19.0751],
// 3 189 12.5 -.25 28 9.4751 -.25 19.0751 10.6316 -.25 17.7579
  [3,189,12.5,-.25,28,9.4751,-.25,19.0751,10.6316,-.25,17.7579],
// 3 189 12.5 -.25 28 10.6316 -.25 17.7579 11.6044 -.25 16.3
  [3,189,12.5,-.25,28,10.6316,-.25,17.7579,11.6044,-.25,16.3],
// 3 189 12.5 -.25 28 11.6044 -.25 16.3 12.3803 -.25 14.7282
  [3,189,12.5,-.25,28,11.6044,-.25,16.3,12.3803,-.25,14.7282],
// 3 189 12.5 -.25 28 12.3803 -.25 14.7282 12.5 -.25 14.375
  [3,189,12.5,-.25,28,12.3803,-.25,14.7282,12.5,-.25,14.375],
// 3 189 12.5 -.25 -9.0132 12.5 -.25 4.8251 12.3803 -.25 4.4718
  [3,189,12.5,-.25,-9.0132,12.5,-.25,4.8251,12.3803,-.25,4.4718],
// 3 189 12.5 -.25 -9.0132 12.3803 -.25 4.4718 11.6044 -.25 2.9
  [3,189,12.5,-.25,-9.0132,12.3803,-.25,4.4718,11.6044,-.25,2.9],
// 3 189 12.5 -.25 -9.0132 11.6044 -.25 2.9 10.6316 -.25 1.4421
  [3,189,12.5,-.25,-9.0132,11.6044,-.25,2.9,10.6316,-.25,1.4421],
// 3 189 12.5 -.25 -9.0132 10.6316 -.25 1.4421 9.4751 -.25 .1249
  [3,189,12.5,-.25,-9.0132,10.6316,-.25,1.4421,9.4751,-.25,.1249],
// 4 189 12.5 -.25 -9.0132 9.4751 -.25 .1249 8.1579 -.25 -1.0316 2.5 -.25 -19.0213
  [4,189,12.5,-.25,-9.0132,9.4751,-.25,.1249,8.1579,-.25,-1.0316,2.5,-.25,-19.0213],
// 3 189 2.5 -.25 -19.0213 8.1579 -.25 -1.0316 6.7 -.25 -2.0044
  [3,189,2.5,-.25,-19.0213,8.1579,-.25,-1.0316,6.7,-.25,-2.0044],
// 3 189 2.5 -.25 -19.0213 6.7 -.25 -2.0044 5.1282 -.25 -2.7803
  [3,189,2.5,-.25,-19.0213,6.7,-.25,-2.0044,5.1282,-.25,-2.7803],
// 3 189 2.5 -.25 -19.0213 5.1282 -.25 -2.7803 3.4679 -.25 -3.3431
  [3,189,2.5,-.25,-19.0213,5.1282,-.25,-2.7803,3.4679,-.25,-3.3431],
// 3 189 2.5 -.25 -19.0213 3.4679 -.25 -3.3431 2.5 -.25 -3.5354
  [3,189,2.5,-.25,-19.0213,3.4679,-.25,-3.3431,2.5,-.25,-3.5354],
// 0 // White faces
// 4 15 13 -.25 9.6 13.2848 -.25 7.8513 13.4 -.25 9.6 13.2848 -.25 11.3487
  [4,15,13,-.25,9.6,13.2848,-.25,7.8513,13.4,-.25,9.6,13.2848,-.25,11.3487],
// 4 15 13 -.25 9.6 13.2848 -.25 11.3487 12.9431 -.25 13.0679 12.5 -.25 14.375
  [4,15,13,-.25,9.6,13.2848,-.25,11.3487,12.9431,-.25,13.0679,12.5,-.25,14.375],
// 4 15 13 -.25 9.6 12.5 -.25 14.375 12.3803 -.25 14.7282 11.6044 -.25 16.3
  [4,15,13,-.25,9.6,12.5,-.25,14.375,12.3803,-.25,14.7282,11.6044,-.25,16.3],
// 4 15 13 -.25 9.6 11.6044 -.25 16.3 10.6316 -.25 17.7579 9 -.25 18.6
  [4,15,13,-.25,9.6,11.6044,-.25,16.3,10.6316,-.25,17.7579,9,-.25,18.6],
// 4 15 9 -.25 18.6 10.6316 -.25 17.7579 9.4751 -.25 19.0751 8.1579 -.25 20.2316
  [4,15,9,-.25,18.6,10.6316,-.25,17.7579,9.4751,-.25,19.0751,8.1579,-.25,20.2316],
// 4 15 9 -.25 18.6 8.1579 -.25 20.2316 6.7 -.25 21.2044 5.1282 -.25 21.9803
  [4,15,9,-.25,18.6,8.1579,-.25,20.2316,6.7,-.25,21.2044,5.1282,-.25,21.9803],
// 4 15 9 -.25 18.6 5.1282 -.25 21.9803 3.4679 -.25 22.5431 2.5 -.25 22.7354
  [4,15,9,-.25,18.6,5.1282,-.25,21.9803,3.4679,-.25,22.5431,2.5,-.25,22.7354],
// 4 15 9 -.25 18.6 2.5 -.25 22.7354 1.7487 -.25 22.8848 0 -.25 23
  [4,15,9,-.25,18.6,2.5,-.25,22.7354,1.7487,-.25,22.8848,0,-.25,23],
// 3 15 9 -.25 18.6 0 -.25 23 -9 -.25 18.6
  [3,15,9,-.25,18.6,0,-.25,23,-9,-.25,18.6],
// 4 15 -9 -.25 18.6 0 -.25 23 -1.7487 -.25 22.8848 -2.5 -.25 22.7354
  [4,15,-9,-.25,18.6,0,-.25,23,-1.7487,-.25,22.8848,-2.5,-.25,22.7354],
// 4 15 -9 -.25 18.6 -2.5 -.25 22.7354 -3.4679 -.25 22.5431 -5.1282 -.25 21.9803
  [4,15,-9,-.25,18.6,-2.5,-.25,22.7354,-3.4679,-.25,22.5431,-5.1282,-.25,21.9803],
// 4 15 -9 -.25 18.6 -5.1282 -.25 21.9803 -6.7 -.25 21.2044 -8.1579 -.25 20.2316
  [4,15,-9,-.25,18.6,-5.1282,-.25,21.9803,-6.7,-.25,21.2044,-8.1579,-.25,20.2316],
// 4 15 -9 -.25 18.6 -8.1579 -.25 20.2316 -9.4751 -.25 19.0751 -10.6316 -.25 17.7579
  [4,15,-9,-.25,18.6,-8.1579,-.25,20.2316,-9.4751,-.25,19.0751,-10.6316,-.25,17.7579],
// 4 15 -13 -.25 9.6 -9 -.25 18.6 -10.6316 -.25 17.7579 -11.6044 -.25 16.3
  [4,15,-13,-.25,9.6,-9,-.25,18.6,-10.6316,-.25,17.7579,-11.6044,-.25,16.3],
// 4 15 -13 -.25 9.6 -11.6044 -.25 16.3 -12.3803 -.25 14.7282 -12.5 -.25 14.375
  [4,15,-13,-.25,9.6,-11.6044,-.25,16.3,-12.3803,-.25,14.7282,-12.5,-.25,14.375],
// 4 15 -13 -.25 9.6 -12.5 -.25 14.375 -12.9431 -.25 13.0679 -13.2848 -.25 11.3487
  [4,15,-13,-.25,9.6,-12.5,-.25,14.375,-12.9431,-.25,13.0679,-13.2848,-.25,11.3487],
// 4 15 -13 -.25 9.6 -13.2848 -.25 11.3487 -13.4 -.25 9.6 -13.2848 -.25 7.8513
  [4,15,-13,-.25,9.6,-13.2848,-.25,11.3487,-13.4,-.25,9.6,-13.2848,-.25,7.8513],
// 4 15 -13 -.25 9.6 -13.2848 -.25 7.8513 -12.9431 -.25 6.1321 -12.5 -.25 4.8251
  [4,15,-13,-.25,9.6,-13.2848,-.25,7.8513,-12.9431,-.25,6.1321,-12.5,-.25,4.8251],
// 4 15 -13 -.25 9.6 -12.5 -.25 4.8251 -12.3803 -.25 4.4718 -11.6044 -.25 2.9
  [4,15,-13,-.25,9.6,-12.5,-.25,4.8251,-12.3803,-.25,4.4718,-11.6044,-.25,2.9],
// 4 15 -13 -.25 9.6 -11.6044 -.25 2.9 -10.6316 -.25 1.4421 -9 -.25 .6
  [4,15,-13,-.25,9.6,-11.6044,-.25,2.9,-10.6316,-.25,1.4421,-9,-.25,.6],
// 4 15 -9 -.25 .6 -10.6316 -.25 1.4421 -9.4751 -.25 .1249 -8.1579 -.25 -1.0316
  [4,15,-9,-.25,.6,-10.6316,-.25,1.4421,-9.4751,-.25,.1249,-8.1579,-.25,-1.0316],
// 4 15 -9 -.25 .6 -8.1579 -.25 -1.0316 -6.7 -.25 -2.0044 -5.1282 -.25 -2.7803
  [4,15,-9,-.25,.6,-8.1579,-.25,-1.0316,-6.7,-.25,-2.0044,-5.1282,-.25,-2.7803],
// 4 15 -9 -.25 .6 -5.1282 -.25 -2.7803 -3.4679 -.25 -3.3431 -2.5 -.25 -3.5354
  [4,15,-9,-.25,.6,-5.1282,-.25,-2.7803,-3.4679,-.25,-3.3431,-2.5,-.25,-3.5354],
// 4 15 -9 -.25 .6 -2.5 -.25 -3.5354 -1.7487 -.25 -3.6848 0 -.25 -3.8
  [4,15,-9,-.25,.6,-2.5,-.25,-3.5354,-1.7487,-.25,-3.6848,0,-.25,-3.8],
// 3 15 -9 -.25 .6 0 -.25 -3.8 9 -.25 .6
  [3,15,-9,-.25,.6,0,-.25,-3.8,9,-.25,.6],
// 4 15 9 -.25 .6 0 -.25 -3.8 1.7487 -.25 -3.6848 2.5 -.25 -3.5354
  [4,15,9,-.25,.6,0,-.25,-3.8,1.7487,-.25,-3.6848,2.5,-.25,-3.5354],
// 4 15 9 -.25 .6 2.5 -.25 -3.5354 3.4679 -.25 -3.3431 5.1282 -.25 -2.7803
  [4,15,9,-.25,.6,2.5,-.25,-3.5354,3.4679,-.25,-3.3431,5.1282,-.25,-2.7803],
// 4 15 9 -.25 .6 5.1282 -.25 -2.7803 6.7 -.25 -2.0044 8.1579 -.25 -1.0316
  [4,15,9,-.25,.6,5.1282,-.25,-2.7803,6.7,-.25,-2.0044,8.1579,-.25,-1.0316],
// 4 15 9 -.25 .6 8.1579 -.25 -1.0316 9.4751 -.25 .1249 10.6316 -.25 1.4421
  [4,15,9,-.25,.6,8.1579,-.25,-1.0316,9.4751,-.25,.1249,10.6316,-.25,1.4421],
// 4 15 13 -.25 9.6 9 -.25 .6 10.6316 -.25 1.4421 11.6044 -.25 2.9
  [4,15,13,-.25,9.6,9,-.25,.6,10.6316,-.25,1.4421,11.6044,-.25,2.9],
// 4 15 13 -.25 9.6 11.6044 -.25 2.9 12.3803 -.25 4.4718 12.5 -.25 4.8251
  [4,15,13,-.25,9.6,11.6044,-.25,2.9,12.3803,-.25,4.4718,12.5,-.25,4.8251],
// 4 15 13 -.25 9.6 12.5 -.25 4.8251 12.9431 -.25 6.1321 13.2848 -.25 7.8513
  [4,15,13,-.25,9.6,12.5,-.25,4.8251,12.9431,-.25,6.1321,13.2848,-.25,7.8513],
];
module ldraw_lib__6218741f(step=0, col=false, unit=2/5, alt=false, line=0.2, solid=!$preview)
    makepoly(ldraw_lib__6218741f(), step=step, col=col, unit=unit, alt=alt, line=line, solid=solid);
ldraw_lib__6218741f(line=0.2);
